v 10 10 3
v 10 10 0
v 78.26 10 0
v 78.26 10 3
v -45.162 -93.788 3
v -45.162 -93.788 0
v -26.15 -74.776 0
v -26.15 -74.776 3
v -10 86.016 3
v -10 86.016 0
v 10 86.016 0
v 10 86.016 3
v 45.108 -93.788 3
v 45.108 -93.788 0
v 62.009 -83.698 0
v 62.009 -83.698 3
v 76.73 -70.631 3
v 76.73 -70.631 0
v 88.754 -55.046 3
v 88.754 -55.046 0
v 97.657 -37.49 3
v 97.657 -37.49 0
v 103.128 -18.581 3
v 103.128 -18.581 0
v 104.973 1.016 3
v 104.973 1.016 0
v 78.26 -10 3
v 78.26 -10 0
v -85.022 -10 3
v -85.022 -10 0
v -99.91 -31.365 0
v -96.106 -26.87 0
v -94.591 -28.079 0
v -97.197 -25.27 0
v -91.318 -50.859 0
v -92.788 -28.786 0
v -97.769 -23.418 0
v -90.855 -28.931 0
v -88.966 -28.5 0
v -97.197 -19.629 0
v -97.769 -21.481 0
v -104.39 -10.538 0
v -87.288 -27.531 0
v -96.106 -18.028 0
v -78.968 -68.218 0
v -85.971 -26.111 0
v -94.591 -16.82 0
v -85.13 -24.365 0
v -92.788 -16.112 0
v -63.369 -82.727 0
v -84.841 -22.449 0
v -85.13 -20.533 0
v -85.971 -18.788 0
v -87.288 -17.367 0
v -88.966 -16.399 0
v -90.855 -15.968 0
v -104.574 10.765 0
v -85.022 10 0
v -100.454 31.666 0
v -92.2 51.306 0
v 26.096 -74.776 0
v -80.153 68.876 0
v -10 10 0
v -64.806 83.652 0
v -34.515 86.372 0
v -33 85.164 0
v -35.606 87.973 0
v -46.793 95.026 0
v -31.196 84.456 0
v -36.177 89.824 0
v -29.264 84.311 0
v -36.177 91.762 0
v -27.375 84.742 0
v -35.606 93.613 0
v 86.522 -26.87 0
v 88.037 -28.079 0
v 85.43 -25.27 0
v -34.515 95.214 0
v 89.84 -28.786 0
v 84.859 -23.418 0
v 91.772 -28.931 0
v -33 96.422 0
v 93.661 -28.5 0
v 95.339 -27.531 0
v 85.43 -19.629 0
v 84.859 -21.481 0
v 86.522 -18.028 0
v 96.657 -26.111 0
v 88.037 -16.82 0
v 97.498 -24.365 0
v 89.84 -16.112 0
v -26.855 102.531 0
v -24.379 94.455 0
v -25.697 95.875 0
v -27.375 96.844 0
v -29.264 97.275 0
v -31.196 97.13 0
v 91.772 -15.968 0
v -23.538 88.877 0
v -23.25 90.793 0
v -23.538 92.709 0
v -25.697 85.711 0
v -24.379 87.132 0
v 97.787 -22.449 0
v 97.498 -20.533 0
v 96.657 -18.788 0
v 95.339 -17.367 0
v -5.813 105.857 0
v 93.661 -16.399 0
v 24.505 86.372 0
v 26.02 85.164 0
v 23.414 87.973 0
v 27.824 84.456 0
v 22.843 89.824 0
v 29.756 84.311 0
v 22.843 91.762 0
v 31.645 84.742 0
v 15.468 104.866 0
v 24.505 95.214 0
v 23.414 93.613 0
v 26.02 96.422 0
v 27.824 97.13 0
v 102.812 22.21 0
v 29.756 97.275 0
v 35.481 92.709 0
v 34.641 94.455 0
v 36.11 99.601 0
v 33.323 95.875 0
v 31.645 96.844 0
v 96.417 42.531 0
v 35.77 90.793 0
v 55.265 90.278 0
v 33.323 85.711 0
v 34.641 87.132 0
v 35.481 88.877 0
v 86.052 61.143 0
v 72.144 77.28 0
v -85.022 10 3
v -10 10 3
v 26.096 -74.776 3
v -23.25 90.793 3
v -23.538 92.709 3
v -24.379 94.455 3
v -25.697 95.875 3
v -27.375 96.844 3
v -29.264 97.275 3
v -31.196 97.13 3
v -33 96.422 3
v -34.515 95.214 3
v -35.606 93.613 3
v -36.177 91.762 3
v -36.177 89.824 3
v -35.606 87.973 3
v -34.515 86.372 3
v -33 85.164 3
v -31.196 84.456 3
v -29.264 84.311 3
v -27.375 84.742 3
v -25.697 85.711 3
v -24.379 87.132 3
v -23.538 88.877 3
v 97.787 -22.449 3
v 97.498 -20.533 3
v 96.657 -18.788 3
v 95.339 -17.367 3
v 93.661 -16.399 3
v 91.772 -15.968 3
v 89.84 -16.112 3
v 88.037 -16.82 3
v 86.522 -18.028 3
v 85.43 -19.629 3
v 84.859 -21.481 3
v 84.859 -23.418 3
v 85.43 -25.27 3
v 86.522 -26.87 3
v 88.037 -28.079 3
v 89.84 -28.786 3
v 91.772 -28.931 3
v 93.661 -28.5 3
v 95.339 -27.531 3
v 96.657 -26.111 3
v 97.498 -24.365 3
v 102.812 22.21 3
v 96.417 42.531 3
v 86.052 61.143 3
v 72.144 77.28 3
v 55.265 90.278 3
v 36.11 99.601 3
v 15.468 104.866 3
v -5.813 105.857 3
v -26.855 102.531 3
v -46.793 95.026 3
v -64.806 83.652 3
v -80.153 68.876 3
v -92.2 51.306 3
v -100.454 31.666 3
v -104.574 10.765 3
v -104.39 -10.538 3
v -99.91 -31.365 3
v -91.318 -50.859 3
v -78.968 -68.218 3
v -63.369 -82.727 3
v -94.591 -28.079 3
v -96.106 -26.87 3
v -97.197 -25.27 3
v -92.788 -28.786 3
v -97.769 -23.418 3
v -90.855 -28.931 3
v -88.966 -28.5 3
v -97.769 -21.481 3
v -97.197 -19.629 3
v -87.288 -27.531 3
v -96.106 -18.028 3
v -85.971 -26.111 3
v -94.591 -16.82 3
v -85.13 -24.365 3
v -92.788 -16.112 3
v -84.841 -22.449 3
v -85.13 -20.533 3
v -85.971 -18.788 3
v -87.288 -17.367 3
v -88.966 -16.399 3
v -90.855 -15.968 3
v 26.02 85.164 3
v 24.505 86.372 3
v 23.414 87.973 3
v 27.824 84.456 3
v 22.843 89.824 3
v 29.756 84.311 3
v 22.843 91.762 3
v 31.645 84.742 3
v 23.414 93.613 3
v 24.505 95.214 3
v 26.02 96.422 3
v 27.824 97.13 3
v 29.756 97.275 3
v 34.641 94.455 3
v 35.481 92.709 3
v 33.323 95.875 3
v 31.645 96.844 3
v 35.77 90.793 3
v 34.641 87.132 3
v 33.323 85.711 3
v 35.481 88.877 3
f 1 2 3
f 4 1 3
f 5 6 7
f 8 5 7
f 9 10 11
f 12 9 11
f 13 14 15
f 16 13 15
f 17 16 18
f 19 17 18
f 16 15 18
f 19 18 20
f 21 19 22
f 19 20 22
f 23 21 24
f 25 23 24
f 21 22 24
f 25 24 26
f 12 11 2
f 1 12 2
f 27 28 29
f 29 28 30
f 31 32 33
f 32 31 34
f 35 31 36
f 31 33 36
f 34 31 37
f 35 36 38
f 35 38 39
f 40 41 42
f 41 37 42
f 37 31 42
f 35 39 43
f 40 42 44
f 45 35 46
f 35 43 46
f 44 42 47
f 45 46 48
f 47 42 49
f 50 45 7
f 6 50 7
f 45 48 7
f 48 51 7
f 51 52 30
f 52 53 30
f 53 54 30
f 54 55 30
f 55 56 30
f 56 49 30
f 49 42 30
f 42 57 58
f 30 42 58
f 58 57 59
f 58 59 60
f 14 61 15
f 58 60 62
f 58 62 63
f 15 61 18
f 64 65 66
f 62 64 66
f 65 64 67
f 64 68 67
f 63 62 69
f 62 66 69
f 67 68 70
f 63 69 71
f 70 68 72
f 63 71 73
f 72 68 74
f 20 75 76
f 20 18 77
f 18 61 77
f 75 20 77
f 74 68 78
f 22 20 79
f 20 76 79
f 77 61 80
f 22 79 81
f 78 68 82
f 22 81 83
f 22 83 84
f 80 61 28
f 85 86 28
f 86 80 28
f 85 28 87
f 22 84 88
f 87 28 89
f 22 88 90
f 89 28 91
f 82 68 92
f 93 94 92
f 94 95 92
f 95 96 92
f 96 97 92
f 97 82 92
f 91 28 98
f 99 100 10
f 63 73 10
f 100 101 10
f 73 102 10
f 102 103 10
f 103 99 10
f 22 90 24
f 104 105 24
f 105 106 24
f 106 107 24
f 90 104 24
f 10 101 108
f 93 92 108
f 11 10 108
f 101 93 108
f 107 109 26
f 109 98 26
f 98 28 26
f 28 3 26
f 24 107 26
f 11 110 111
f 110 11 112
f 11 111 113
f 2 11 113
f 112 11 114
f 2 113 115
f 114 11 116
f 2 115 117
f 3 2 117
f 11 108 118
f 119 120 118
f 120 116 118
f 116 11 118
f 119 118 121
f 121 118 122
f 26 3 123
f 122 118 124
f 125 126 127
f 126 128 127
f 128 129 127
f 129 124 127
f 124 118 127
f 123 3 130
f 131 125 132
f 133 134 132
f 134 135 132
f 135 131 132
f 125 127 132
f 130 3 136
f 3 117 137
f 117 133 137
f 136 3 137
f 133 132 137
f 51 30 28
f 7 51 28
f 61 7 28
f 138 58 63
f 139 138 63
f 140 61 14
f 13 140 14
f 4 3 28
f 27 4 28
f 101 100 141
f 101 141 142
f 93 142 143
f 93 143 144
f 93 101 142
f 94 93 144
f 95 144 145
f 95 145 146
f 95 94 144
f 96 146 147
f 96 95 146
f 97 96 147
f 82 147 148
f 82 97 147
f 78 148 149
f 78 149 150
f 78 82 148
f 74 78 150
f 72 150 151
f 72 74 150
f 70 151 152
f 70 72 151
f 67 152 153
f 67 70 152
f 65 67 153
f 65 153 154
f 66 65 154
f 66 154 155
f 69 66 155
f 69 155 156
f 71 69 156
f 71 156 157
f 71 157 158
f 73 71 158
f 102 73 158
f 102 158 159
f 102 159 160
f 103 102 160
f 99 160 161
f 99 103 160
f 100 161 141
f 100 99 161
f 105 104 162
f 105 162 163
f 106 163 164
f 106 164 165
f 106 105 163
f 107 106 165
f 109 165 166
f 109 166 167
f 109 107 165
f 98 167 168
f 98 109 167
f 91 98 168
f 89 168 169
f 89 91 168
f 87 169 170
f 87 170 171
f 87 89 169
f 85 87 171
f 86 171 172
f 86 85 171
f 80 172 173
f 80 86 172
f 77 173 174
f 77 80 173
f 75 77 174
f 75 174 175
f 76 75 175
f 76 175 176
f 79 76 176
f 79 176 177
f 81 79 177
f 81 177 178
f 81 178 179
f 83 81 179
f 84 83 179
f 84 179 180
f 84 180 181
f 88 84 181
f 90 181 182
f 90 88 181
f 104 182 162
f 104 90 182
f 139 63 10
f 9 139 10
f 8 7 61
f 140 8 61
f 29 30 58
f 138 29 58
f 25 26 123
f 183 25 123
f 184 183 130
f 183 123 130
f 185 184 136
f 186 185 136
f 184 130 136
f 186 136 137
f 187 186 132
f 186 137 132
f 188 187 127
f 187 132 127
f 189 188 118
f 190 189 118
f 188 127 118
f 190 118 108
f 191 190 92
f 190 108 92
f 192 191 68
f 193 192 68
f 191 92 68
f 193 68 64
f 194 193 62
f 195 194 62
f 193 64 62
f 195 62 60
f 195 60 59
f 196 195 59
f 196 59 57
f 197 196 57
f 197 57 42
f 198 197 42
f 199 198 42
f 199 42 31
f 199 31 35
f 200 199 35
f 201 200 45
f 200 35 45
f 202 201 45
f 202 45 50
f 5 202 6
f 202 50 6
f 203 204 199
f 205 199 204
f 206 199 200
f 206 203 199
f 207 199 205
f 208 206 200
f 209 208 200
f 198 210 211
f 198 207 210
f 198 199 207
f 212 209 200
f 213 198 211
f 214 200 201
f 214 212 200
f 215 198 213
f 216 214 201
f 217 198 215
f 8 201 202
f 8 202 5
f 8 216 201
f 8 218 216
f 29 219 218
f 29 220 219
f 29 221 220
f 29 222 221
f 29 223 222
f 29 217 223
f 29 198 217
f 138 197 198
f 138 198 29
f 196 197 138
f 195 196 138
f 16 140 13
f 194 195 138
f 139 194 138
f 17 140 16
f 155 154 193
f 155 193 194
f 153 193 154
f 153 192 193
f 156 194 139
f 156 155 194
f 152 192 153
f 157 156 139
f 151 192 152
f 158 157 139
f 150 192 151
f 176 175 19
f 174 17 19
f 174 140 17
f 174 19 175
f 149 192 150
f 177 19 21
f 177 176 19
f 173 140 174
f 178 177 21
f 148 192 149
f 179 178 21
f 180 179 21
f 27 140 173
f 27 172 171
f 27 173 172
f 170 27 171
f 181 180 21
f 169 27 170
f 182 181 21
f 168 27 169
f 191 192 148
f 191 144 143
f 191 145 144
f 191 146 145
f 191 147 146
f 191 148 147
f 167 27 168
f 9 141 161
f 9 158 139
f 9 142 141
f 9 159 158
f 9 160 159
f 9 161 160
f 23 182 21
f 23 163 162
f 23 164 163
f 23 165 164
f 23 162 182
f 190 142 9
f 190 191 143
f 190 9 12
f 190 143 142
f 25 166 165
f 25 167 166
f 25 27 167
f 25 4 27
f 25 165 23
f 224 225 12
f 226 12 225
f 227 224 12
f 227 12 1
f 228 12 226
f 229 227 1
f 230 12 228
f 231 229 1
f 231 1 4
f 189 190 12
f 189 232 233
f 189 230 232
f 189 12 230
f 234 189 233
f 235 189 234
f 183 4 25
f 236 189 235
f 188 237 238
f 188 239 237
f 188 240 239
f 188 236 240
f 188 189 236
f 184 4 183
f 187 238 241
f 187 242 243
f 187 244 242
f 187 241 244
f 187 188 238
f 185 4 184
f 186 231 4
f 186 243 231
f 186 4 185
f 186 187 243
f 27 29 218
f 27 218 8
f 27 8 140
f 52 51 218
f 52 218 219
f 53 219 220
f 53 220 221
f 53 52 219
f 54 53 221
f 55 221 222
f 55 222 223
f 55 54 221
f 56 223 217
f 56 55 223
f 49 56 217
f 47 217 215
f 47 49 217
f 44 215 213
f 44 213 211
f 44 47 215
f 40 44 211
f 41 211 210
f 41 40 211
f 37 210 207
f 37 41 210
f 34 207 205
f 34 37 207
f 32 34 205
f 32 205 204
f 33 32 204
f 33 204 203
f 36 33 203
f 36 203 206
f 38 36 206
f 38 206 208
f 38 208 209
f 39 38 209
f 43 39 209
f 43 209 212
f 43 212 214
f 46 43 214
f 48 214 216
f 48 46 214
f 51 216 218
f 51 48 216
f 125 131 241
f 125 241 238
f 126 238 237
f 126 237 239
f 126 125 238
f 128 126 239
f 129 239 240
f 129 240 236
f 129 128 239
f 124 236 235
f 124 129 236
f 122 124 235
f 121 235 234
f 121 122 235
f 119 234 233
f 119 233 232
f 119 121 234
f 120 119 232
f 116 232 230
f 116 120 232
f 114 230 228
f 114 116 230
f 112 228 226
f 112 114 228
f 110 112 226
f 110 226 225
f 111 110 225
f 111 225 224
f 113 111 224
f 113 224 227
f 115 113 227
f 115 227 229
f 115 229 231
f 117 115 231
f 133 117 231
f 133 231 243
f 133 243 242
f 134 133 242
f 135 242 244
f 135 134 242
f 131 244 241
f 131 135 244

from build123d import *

# Parameters (mm, degrees)
F0_R     = 6.5
F1_DEPTH = 3


with BuildPart() as f1:
    # F0 (on Top) → F1 (new body)
    with BuildSketch(Plane.XY):
        with BuildLine():
            ThreePointArc((45.107527, -93.788211), (88.753802, -55.045718), (104.972745, 1.016069))
            ThreePointArc((104.972745, 1.016069), (-56.089042, 89.797126), (-45.162038, -93.788211))
            Line((-45.162038, -93.788211), (-26.15007, -74.776243))
            Line((-26.15007, -74.776243), (26.095559, -74.776243))
            Line((26.095559, -74.776243), (45.107527, -93.788211))
        make_face()
        with Locations((-91.341169, -22.449345)):
            Circle(F0_R, mode=Mode.SUBTRACT)
        with Locations((91.286659, -22.449345)):
            Circle(F0_R, mode=Mode.SUBTRACT)
        Polygon((-85.022339, -10), (-85.022339, 0), (-85.022339, 10), (-10, 10), (-10, 86.016065), (0, 86.016065), (10, 86.016065), (10, 10), (78.260288, 10), (78.260288, 0), (78.260288, -10), align=None, mode=Mode.SUBTRACT)
        with Locations((-29.749685, 90.793084)):
            Circle(F0_R, mode=Mode.SUBTRACT)
        with Locations((29.269962, 90.793084)):
            Circle(F0_R, mode=Mode.SUBTRACT)
    extrude(amount=F1_DEPTH)


solid = f1.part
